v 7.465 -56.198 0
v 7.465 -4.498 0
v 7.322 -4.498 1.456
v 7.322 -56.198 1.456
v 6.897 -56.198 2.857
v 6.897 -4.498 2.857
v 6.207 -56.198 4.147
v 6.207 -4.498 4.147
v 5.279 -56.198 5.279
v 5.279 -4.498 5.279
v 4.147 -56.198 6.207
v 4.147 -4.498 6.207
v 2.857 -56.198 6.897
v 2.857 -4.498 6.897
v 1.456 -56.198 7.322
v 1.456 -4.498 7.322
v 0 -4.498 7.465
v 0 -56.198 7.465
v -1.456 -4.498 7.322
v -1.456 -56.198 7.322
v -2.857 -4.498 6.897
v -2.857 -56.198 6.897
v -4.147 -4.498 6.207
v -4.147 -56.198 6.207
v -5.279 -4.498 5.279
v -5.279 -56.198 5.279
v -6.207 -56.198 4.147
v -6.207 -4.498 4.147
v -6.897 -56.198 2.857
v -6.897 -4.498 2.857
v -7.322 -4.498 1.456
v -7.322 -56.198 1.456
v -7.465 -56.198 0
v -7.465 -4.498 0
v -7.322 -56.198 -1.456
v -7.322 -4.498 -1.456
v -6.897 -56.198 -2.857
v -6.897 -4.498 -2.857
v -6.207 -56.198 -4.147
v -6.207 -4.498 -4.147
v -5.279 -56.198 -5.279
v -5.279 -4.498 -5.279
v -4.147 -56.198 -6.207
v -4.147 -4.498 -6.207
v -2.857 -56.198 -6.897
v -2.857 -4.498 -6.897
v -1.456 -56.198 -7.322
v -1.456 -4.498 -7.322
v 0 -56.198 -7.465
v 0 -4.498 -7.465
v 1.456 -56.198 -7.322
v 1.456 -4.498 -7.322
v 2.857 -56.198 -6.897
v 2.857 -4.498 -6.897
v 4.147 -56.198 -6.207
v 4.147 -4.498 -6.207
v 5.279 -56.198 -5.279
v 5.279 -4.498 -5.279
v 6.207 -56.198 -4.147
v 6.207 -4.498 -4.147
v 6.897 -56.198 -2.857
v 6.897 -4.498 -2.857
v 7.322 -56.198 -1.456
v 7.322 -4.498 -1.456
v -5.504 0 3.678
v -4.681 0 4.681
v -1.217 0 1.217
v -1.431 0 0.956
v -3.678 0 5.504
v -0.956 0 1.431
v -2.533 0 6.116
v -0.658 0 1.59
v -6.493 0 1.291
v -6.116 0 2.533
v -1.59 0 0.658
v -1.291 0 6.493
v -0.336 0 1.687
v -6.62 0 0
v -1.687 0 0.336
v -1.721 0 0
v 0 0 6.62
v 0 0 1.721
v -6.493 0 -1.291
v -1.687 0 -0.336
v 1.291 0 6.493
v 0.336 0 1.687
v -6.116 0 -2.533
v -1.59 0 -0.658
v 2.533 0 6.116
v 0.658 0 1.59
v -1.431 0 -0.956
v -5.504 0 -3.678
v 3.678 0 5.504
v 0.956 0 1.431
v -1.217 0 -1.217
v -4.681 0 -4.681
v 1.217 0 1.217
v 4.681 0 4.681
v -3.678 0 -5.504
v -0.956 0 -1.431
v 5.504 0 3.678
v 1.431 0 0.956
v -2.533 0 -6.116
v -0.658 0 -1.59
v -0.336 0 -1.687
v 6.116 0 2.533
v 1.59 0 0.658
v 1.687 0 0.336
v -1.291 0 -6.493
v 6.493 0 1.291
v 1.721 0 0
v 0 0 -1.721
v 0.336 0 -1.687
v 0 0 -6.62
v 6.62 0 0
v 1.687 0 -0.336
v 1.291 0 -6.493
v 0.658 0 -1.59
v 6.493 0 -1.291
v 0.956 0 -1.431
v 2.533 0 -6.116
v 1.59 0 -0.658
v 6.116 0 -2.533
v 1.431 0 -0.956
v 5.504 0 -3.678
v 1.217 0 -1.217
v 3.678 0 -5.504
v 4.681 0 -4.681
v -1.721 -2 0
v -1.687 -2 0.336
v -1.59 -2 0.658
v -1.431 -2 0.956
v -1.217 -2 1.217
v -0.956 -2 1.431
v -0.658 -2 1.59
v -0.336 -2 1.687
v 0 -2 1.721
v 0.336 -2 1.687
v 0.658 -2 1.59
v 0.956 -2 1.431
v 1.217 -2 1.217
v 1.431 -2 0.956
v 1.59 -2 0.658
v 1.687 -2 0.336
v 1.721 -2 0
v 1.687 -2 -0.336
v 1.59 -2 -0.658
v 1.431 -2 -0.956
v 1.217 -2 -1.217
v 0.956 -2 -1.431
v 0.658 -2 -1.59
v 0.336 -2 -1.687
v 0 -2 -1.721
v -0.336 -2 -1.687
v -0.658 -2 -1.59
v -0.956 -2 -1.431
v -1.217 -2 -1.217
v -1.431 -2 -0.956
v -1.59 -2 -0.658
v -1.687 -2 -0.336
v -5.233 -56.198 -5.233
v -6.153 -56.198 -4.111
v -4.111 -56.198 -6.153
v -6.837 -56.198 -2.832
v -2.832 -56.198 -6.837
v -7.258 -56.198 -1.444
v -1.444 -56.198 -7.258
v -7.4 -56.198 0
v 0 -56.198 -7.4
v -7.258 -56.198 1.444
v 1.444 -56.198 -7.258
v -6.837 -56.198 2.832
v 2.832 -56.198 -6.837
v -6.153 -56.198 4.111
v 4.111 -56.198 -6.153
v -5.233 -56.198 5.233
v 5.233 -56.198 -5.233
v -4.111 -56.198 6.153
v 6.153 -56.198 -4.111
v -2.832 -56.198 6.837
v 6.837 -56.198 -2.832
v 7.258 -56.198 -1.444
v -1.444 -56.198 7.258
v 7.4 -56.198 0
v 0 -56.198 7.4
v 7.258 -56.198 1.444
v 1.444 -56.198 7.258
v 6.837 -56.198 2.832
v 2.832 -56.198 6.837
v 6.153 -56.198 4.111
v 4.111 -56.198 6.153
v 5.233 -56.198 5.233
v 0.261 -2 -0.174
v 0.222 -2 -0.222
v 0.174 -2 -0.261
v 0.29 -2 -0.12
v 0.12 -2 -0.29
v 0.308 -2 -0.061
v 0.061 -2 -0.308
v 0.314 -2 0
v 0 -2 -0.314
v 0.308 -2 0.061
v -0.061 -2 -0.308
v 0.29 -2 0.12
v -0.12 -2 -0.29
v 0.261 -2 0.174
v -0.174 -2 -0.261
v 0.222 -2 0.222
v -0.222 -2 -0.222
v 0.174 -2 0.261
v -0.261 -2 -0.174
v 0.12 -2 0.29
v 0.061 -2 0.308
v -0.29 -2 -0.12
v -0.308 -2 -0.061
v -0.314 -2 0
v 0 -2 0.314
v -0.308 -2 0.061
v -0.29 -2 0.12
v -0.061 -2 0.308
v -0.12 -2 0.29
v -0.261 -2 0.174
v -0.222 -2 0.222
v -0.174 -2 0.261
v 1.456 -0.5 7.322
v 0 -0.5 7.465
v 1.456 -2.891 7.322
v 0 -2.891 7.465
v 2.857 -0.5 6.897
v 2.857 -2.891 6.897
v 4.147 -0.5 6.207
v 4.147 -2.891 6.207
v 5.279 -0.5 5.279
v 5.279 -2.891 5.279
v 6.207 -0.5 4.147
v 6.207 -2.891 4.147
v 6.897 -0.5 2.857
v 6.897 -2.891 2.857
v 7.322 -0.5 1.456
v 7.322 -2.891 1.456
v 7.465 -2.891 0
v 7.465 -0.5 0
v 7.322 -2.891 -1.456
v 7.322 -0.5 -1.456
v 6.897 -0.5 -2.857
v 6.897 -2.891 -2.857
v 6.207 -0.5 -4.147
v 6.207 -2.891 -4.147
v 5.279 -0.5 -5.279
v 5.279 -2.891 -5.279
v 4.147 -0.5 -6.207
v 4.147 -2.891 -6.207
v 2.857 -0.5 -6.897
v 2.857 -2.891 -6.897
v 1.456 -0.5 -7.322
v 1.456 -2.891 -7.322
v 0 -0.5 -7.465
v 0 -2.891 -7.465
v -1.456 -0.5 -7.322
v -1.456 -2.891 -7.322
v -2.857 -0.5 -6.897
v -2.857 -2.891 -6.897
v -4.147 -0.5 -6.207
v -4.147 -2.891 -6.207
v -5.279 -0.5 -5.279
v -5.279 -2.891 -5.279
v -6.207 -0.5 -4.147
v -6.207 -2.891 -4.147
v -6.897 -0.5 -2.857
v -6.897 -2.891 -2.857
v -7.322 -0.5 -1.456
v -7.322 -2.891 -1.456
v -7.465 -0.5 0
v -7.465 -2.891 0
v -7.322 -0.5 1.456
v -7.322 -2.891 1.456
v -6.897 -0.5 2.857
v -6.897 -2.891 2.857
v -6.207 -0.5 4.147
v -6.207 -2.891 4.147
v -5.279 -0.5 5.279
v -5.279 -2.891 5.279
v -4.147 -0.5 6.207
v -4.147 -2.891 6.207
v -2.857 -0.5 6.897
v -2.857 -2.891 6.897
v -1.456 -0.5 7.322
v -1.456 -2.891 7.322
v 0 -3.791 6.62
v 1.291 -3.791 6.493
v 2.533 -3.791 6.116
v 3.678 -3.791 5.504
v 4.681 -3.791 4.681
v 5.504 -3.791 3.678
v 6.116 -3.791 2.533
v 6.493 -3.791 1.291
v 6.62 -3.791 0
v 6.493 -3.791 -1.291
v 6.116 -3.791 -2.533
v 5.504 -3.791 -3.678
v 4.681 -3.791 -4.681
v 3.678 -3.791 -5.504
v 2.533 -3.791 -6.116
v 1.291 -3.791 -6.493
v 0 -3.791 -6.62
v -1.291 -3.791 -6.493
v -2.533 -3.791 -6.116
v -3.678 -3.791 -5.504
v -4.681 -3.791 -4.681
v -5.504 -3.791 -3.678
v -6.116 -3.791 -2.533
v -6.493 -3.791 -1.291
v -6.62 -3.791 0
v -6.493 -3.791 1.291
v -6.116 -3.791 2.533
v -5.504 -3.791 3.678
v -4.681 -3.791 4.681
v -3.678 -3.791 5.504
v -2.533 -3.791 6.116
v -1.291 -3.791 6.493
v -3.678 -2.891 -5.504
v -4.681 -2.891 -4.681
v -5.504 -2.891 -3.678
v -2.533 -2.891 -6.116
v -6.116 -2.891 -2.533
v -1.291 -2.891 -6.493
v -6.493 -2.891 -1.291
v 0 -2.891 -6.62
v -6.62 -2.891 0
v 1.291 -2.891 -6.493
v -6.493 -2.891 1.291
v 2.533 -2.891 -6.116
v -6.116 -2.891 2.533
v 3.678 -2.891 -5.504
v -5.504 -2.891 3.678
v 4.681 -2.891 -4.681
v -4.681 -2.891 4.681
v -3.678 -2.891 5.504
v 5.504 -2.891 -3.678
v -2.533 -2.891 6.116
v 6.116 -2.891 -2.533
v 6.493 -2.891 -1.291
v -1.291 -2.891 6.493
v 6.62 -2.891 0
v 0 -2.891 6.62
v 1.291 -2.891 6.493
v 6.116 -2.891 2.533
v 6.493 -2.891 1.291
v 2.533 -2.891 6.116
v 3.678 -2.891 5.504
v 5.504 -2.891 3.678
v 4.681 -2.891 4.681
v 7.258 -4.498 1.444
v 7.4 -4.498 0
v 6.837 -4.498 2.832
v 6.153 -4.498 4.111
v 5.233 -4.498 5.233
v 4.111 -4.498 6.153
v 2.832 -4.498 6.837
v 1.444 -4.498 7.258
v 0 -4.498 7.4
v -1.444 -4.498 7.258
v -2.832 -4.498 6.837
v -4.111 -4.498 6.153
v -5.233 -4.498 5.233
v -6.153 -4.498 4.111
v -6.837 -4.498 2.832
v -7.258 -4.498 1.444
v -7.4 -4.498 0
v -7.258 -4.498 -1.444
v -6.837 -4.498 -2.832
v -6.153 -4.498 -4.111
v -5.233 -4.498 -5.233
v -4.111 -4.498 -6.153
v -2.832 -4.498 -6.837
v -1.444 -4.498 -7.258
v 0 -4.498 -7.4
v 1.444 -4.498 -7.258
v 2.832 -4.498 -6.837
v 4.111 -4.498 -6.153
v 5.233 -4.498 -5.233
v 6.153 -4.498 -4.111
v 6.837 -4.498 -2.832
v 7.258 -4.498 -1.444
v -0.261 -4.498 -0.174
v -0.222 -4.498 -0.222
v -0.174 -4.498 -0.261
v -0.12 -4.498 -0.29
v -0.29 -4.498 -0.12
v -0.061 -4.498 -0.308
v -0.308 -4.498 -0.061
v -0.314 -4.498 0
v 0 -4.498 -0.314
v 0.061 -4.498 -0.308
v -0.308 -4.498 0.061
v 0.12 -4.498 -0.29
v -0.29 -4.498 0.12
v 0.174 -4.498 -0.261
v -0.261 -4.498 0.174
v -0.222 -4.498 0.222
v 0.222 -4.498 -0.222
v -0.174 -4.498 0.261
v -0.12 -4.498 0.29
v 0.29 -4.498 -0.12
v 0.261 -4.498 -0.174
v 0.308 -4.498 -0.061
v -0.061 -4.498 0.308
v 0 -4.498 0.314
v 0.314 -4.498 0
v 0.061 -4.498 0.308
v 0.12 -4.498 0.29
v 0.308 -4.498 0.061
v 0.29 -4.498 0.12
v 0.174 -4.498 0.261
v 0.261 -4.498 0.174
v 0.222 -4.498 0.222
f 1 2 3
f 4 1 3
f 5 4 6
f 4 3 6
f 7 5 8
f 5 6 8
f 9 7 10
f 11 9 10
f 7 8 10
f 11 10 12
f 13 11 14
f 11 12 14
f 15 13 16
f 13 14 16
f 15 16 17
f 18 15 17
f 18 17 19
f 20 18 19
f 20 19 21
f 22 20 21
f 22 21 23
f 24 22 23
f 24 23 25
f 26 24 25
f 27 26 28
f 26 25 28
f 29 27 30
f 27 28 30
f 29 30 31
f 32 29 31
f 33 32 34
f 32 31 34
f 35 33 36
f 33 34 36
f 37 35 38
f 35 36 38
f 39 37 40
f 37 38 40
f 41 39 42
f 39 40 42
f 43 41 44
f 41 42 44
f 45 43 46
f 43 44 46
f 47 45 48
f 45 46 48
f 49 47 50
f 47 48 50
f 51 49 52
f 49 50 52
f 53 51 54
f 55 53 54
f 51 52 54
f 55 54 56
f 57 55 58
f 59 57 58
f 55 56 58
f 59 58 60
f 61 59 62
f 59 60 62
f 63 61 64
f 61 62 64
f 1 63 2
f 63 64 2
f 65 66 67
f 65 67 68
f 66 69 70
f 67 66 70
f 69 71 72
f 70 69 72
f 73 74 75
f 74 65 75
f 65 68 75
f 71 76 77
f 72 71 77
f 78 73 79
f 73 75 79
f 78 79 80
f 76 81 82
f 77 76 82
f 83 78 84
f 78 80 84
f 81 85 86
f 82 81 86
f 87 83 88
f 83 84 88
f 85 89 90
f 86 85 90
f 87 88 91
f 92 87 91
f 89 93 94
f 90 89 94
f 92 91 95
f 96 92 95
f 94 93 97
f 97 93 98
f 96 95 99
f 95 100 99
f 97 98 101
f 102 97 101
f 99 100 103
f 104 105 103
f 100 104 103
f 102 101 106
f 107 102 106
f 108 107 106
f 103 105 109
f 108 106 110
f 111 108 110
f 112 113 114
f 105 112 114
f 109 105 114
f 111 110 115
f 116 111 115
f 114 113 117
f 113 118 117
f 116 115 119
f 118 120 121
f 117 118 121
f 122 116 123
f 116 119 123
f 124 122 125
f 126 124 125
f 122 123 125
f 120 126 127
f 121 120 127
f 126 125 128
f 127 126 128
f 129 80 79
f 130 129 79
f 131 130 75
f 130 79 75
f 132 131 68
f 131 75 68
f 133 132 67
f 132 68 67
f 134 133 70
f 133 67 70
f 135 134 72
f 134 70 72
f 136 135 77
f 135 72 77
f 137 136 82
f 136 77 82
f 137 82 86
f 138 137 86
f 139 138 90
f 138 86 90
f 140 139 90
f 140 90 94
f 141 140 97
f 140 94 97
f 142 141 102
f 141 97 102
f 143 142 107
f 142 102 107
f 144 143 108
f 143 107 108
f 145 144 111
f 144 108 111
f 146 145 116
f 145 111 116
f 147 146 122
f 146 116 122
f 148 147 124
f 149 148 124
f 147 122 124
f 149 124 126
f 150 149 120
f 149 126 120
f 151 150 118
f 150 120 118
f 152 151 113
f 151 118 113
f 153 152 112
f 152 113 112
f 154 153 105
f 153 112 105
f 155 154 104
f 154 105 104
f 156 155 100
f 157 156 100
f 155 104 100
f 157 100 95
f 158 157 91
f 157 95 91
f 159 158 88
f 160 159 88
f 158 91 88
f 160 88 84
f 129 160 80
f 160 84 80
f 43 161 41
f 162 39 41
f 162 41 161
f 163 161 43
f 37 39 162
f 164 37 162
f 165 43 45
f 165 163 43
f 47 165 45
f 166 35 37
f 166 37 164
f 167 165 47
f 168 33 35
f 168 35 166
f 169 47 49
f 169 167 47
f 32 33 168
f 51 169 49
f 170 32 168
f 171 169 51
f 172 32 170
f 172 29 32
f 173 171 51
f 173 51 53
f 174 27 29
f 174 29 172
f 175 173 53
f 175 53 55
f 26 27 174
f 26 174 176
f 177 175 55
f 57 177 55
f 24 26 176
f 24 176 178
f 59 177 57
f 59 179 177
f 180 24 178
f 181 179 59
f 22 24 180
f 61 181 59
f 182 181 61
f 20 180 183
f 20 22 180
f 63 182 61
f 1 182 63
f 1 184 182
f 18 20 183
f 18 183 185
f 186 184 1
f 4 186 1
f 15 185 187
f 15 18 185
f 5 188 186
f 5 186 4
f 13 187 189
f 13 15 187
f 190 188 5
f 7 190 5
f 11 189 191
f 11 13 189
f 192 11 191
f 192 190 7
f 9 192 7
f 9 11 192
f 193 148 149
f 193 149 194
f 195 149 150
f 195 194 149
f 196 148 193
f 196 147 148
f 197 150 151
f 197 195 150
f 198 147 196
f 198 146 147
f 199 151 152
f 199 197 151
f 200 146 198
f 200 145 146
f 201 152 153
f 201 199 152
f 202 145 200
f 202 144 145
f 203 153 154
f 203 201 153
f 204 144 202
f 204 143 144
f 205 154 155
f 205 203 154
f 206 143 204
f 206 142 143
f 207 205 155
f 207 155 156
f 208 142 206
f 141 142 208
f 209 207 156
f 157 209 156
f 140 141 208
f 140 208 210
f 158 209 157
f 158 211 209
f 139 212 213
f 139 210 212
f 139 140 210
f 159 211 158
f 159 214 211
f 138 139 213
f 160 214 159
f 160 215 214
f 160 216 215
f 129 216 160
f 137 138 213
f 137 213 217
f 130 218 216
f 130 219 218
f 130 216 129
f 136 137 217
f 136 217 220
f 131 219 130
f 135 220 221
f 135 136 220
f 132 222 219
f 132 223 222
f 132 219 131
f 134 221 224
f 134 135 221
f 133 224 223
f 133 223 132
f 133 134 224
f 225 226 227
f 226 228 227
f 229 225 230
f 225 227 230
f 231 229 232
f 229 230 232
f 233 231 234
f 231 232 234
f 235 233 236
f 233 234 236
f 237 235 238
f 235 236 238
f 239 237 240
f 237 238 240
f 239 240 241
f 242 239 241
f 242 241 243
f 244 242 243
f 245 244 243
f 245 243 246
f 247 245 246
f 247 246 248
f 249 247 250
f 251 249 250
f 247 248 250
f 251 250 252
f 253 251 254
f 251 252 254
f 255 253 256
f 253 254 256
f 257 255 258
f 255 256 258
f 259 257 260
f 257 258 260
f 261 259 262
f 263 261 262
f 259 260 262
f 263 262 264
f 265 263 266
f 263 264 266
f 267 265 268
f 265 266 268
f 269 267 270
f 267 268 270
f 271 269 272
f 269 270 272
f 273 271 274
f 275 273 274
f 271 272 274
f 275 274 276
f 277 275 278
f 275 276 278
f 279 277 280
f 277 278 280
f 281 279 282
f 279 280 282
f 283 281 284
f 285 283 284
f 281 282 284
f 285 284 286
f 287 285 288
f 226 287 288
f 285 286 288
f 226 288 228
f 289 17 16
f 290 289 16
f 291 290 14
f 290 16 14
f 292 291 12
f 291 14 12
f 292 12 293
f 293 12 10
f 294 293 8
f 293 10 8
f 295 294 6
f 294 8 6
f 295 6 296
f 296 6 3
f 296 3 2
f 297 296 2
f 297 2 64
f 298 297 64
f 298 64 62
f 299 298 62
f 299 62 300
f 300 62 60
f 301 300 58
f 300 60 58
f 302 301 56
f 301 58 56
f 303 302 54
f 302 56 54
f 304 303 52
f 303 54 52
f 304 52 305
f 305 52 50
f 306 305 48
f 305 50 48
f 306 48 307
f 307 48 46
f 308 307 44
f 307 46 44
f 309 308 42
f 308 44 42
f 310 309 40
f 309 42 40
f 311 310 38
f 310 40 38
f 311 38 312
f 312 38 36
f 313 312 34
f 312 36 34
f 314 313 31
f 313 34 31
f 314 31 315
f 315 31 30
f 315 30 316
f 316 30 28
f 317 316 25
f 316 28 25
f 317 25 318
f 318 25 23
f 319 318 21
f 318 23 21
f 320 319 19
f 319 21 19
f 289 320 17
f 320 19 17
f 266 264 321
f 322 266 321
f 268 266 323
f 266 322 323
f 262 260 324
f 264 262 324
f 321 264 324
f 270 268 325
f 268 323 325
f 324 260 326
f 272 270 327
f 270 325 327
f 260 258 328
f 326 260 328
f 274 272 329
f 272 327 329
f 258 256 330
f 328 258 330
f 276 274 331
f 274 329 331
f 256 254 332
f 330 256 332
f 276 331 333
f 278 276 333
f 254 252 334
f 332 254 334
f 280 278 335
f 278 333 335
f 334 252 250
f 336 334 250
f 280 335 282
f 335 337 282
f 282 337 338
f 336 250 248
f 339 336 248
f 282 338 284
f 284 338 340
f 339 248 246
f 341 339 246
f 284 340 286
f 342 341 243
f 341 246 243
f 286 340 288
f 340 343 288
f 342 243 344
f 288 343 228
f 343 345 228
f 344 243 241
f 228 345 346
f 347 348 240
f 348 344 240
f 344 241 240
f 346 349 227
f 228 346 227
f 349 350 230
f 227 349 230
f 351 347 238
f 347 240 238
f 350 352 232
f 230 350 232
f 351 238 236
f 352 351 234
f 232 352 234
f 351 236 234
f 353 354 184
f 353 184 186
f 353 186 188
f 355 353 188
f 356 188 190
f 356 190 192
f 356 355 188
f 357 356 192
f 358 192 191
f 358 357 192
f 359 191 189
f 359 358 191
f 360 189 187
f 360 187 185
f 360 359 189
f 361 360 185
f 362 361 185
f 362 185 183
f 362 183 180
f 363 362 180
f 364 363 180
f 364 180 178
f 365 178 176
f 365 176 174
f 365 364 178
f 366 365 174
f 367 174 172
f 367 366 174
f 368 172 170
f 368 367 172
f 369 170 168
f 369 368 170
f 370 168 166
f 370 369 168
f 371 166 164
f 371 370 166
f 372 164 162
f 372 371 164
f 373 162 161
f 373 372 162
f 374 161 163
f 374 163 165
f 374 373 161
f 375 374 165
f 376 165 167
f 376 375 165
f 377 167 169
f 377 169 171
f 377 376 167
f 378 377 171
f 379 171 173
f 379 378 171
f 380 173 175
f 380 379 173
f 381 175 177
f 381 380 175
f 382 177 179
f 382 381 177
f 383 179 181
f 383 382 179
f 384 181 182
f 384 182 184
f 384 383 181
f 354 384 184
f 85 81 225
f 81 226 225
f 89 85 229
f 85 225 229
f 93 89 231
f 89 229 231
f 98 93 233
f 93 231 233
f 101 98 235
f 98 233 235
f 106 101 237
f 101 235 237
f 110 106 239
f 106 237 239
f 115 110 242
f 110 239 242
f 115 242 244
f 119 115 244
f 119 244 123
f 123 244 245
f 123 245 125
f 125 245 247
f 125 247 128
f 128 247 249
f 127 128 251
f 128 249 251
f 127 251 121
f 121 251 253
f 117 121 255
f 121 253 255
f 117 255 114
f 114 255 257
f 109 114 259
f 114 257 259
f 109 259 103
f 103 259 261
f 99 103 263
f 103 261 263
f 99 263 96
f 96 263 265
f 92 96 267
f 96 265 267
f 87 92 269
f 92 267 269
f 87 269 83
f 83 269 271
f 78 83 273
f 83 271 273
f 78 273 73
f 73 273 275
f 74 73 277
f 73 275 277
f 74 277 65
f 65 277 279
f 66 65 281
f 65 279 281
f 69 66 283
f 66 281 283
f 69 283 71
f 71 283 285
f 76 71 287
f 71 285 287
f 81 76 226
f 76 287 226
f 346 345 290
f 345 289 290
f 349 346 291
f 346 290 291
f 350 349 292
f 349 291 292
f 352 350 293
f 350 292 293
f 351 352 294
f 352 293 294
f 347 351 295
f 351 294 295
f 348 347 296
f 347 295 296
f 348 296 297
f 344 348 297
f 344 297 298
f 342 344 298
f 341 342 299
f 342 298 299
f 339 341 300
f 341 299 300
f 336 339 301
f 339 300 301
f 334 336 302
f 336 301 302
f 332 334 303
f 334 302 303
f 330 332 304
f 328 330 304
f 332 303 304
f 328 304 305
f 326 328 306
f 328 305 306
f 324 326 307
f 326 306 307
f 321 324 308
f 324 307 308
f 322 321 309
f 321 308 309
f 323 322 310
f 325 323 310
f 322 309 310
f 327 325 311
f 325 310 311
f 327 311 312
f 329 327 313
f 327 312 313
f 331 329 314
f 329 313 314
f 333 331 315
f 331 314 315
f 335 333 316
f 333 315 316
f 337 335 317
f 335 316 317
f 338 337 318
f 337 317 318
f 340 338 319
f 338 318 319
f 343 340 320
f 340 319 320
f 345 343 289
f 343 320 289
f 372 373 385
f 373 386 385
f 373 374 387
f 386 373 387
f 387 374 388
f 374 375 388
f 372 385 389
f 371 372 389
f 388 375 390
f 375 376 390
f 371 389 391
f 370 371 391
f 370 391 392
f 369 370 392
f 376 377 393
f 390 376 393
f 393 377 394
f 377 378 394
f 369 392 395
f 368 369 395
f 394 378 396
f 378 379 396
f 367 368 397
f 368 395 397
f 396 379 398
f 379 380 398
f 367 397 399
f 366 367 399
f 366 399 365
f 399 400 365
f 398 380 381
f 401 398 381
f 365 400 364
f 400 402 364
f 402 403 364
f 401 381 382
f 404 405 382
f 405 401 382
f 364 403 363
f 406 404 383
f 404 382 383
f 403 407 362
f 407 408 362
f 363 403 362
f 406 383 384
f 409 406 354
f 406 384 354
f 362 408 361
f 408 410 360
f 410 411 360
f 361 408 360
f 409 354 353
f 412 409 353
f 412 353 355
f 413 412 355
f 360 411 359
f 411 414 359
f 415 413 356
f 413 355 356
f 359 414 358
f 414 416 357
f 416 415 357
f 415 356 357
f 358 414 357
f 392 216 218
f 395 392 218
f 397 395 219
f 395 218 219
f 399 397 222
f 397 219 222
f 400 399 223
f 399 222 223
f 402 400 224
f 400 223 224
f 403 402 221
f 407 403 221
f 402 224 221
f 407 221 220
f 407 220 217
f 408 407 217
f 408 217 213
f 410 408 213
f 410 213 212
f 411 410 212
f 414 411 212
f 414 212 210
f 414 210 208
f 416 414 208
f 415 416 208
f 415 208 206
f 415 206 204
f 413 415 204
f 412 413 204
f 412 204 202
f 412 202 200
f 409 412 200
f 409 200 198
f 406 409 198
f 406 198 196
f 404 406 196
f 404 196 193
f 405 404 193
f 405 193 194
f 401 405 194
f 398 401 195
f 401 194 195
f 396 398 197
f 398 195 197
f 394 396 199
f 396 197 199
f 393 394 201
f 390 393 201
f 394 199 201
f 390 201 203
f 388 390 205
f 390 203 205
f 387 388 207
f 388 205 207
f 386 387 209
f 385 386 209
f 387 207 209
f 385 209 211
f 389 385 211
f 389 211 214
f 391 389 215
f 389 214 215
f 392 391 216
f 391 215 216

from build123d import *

# Parameters (mm, degrees)
F2_R     = 7.465
F2_R_2   = 7.4
F3_DEPTH = 51.7
F4_R     = 1.720525
F5_DEPTH = 2
F6_R     = 0.31391
F7_DEPTH = 54.198547


with BuildPart() as f1:
    # F0 (on Right) → F1 (revolve)
    with BuildSketch(Plane.YZ):
        Polygon((-4.497547, 0), (0, 0), (0, 6.62), (-0.5, 7.465), (-2.890516, 7.465), (-2.890516, 6.62), (-3.790516, 6.62), (-4.497547, 7.465), align=None)
    revolve(axis=Axis((0, -2.248773, 0), (0, 1, 0)))

    # F2 (on face) → F3 (join)
    with BuildSketch(Plane.XZ.offset(4.497547)):
        Circle(F2_R)
        Circle(F2_R_2, mode=Mode.SUBTRACT)
    extrude(amount=F3_DEPTH)

    # F4 (on face) → F5 (cut)
    with BuildSketch(Plane(origin=(0, 0, 0), x_dir=(-1, 0, 0), z_dir=(0, 1, 0))):
        Circle(F4_R)
    extrude(amount=-F5_DEPTH, mode=Mode.SUBTRACT)

    # F6 (on face) → F7 (cut, through all)
    with BuildSketch(Plane(origin=(0, -2, 0), x_dir=(-1, 0, 0), z_dir=(0, 1, 0))):
        Circle(F6_R)
    extrude(amount=-F7_DEPTH, mode=Mode.SUBTRACT)


solid = f1.part
